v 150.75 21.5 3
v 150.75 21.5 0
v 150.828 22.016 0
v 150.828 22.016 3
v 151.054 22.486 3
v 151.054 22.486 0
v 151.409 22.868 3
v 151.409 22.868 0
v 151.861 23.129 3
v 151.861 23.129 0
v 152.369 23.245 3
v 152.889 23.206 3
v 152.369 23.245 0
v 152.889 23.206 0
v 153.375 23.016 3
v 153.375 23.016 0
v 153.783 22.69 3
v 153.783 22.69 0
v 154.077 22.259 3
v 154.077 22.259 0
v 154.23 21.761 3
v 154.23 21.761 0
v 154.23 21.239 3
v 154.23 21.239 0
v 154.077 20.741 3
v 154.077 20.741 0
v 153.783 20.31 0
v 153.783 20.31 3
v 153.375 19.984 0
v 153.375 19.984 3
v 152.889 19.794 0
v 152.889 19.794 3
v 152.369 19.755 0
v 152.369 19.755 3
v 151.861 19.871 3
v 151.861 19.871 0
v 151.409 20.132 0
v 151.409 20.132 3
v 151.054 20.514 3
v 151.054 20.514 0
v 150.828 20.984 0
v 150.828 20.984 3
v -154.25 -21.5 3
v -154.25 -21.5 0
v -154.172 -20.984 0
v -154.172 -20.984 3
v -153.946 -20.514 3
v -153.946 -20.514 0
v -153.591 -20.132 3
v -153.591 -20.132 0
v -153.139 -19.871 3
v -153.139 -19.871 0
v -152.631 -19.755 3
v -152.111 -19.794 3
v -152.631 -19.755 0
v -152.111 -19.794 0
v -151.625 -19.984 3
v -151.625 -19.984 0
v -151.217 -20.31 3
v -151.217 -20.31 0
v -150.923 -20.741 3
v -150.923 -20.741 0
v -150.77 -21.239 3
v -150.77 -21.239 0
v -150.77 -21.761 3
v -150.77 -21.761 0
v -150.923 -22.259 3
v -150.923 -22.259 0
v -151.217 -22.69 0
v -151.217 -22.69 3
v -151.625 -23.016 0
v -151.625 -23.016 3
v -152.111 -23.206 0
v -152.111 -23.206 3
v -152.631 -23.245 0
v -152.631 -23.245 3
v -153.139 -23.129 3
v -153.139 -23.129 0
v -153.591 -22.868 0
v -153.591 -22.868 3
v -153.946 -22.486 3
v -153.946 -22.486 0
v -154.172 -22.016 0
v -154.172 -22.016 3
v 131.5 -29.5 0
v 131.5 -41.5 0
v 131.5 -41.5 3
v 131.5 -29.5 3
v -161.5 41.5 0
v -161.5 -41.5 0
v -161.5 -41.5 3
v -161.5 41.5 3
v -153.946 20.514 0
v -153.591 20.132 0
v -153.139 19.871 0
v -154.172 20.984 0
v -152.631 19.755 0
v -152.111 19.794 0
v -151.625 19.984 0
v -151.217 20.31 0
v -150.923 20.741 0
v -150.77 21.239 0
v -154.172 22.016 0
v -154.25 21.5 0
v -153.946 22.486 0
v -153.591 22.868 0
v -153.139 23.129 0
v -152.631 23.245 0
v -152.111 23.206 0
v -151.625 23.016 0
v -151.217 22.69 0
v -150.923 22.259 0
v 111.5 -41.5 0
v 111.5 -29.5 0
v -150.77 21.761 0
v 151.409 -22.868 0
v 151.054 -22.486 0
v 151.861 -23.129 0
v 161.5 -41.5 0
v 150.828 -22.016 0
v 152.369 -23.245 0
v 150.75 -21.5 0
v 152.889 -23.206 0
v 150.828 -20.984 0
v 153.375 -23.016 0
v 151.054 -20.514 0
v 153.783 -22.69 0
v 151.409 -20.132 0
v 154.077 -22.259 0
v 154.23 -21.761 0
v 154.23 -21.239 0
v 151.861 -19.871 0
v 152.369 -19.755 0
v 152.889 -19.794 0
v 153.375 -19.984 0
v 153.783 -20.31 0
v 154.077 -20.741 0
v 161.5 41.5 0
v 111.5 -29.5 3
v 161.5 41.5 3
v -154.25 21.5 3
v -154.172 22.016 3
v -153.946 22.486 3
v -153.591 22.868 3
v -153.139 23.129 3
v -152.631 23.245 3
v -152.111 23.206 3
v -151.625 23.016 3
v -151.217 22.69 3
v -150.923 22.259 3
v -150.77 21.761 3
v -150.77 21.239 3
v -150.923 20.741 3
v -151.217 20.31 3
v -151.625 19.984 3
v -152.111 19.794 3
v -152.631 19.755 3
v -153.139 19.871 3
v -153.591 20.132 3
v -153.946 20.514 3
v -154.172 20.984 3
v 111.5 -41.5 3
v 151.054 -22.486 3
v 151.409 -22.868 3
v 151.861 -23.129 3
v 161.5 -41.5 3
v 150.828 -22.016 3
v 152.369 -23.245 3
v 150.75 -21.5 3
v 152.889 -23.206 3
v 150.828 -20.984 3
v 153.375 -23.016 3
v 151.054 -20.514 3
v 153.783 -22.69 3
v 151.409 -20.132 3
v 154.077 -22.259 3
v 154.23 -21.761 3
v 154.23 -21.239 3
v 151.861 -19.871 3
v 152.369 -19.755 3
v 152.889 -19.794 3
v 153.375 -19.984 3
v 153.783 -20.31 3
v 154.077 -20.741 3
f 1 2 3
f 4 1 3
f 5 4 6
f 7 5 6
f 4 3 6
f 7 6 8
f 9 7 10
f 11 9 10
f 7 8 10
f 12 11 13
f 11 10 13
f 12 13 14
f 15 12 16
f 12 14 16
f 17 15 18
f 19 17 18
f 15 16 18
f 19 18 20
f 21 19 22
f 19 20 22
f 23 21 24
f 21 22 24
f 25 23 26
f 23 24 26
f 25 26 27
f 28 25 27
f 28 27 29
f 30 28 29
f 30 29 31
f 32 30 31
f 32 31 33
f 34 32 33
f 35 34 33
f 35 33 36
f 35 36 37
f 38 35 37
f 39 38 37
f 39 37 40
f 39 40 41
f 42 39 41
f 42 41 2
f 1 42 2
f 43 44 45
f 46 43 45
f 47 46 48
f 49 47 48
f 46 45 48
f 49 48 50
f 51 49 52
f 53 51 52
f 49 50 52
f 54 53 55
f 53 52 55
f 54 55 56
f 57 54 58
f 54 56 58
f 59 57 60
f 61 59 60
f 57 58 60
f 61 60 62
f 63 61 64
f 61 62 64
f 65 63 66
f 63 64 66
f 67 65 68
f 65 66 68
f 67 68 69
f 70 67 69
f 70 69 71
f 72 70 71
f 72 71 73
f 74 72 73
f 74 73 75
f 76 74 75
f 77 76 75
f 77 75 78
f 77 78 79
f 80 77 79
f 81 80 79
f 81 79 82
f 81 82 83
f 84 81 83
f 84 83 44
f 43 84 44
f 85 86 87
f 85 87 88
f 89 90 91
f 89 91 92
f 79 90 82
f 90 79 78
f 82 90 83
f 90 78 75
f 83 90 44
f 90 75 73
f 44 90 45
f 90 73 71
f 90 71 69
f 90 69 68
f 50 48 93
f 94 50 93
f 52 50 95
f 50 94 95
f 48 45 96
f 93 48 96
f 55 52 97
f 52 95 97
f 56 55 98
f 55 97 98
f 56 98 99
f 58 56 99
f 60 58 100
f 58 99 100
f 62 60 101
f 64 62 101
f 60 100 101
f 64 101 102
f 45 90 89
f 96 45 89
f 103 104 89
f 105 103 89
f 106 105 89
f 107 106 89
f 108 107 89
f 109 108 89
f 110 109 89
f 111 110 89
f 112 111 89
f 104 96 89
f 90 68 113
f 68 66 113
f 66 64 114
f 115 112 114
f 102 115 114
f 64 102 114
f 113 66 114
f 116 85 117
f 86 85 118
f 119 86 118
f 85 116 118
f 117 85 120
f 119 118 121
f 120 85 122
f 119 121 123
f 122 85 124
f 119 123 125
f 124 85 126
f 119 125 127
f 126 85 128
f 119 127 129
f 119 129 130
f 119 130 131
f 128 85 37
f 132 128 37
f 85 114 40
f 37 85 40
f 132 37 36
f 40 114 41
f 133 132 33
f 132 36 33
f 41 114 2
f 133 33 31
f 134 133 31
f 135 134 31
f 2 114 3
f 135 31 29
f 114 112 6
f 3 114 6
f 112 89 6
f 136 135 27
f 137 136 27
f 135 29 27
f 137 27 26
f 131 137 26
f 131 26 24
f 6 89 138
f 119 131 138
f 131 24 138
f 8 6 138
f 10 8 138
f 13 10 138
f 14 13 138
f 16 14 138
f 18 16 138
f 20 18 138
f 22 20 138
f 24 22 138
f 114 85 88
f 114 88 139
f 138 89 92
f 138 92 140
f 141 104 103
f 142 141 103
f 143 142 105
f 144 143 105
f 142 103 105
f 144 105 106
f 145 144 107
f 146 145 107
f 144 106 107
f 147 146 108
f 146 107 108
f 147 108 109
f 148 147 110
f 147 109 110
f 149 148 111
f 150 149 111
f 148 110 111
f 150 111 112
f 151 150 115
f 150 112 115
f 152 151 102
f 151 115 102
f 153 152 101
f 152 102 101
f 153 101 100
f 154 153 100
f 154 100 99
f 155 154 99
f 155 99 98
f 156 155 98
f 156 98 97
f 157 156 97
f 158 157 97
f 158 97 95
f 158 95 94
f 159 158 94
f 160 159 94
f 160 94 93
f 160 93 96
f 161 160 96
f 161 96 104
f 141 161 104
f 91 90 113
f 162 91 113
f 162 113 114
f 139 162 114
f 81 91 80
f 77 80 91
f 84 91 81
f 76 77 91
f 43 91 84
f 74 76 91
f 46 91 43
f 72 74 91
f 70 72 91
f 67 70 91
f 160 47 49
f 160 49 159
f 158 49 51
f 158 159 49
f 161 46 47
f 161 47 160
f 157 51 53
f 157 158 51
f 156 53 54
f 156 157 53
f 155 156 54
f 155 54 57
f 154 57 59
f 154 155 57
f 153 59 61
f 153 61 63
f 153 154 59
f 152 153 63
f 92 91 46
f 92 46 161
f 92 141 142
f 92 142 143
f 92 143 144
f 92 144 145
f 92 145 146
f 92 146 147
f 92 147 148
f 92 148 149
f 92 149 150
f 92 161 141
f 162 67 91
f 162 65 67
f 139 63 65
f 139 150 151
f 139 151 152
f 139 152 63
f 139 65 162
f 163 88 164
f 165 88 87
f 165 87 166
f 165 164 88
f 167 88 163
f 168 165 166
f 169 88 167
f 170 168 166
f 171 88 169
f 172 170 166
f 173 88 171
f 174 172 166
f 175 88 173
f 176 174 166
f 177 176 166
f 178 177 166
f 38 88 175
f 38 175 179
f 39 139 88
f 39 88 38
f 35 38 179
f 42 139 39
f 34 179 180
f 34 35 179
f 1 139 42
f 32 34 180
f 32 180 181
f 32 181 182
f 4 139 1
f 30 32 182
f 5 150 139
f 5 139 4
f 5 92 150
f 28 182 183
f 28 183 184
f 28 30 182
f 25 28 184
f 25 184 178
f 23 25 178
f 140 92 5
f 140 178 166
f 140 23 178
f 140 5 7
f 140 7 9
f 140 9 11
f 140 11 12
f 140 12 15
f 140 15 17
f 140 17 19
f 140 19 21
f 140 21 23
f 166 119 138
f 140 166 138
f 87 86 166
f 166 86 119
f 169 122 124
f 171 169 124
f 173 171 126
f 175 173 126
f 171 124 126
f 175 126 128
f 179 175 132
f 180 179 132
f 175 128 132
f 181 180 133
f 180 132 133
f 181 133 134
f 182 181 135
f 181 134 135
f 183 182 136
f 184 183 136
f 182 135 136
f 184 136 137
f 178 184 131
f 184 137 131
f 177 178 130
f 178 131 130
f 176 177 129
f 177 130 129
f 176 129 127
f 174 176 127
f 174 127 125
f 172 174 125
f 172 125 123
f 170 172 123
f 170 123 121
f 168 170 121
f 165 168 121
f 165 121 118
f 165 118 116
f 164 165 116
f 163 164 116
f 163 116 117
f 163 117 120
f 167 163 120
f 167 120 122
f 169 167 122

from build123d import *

# Parameters (mm, degrees)
SKETCH1_W           = 323
SKETCH1_H           = 83
BOSS_EXTRUDE1_DEPTH = 3
SKETCH2_W           = 20
SKETCH2_H           = 12
CUT_EXTRUDE1_DEPTH  = 10
SKETCH4_R           = 1.75
CUT_EXTRUDE2_DEPTH  = 4


with BuildPart() as part:
    # Sketch1 → Boss-Extrude1 (new body)
    with BuildSketch(Plane.XY):
        Rectangle(SKETCH1_W, SKETCH1_H)
    extrude(amount=BOSS_EXTRUDE1_DEPTH)

    # Sketch2 → Cut-Extrude1 (cut)
    with BuildSketch(Plane(origin=(0, 0, 0), x_dir=(-1, 0, 0), z_dir=(0, 0, -1))):
        with Locations((-121.5, -35.5)):
            Rectangle(SKETCH2_W, SKETCH2_H)
    extrude(amount=-CUT_EXTRUDE1_DEPTH, mode=Mode.SUBTRACT)

    # Sketch4 → Cut-Extrude2 (cut, through all)
    with BuildSketch(Plane(origin=(0, 0, 0), x_dir=(-1, 0, 0), z_dir=(0, 0, -1))):
        with Locations((152.5, -21.5)):
            Circle(SKETCH4_R)
        with Locations((-152.5, -21.5)):
            Circle(SKETCH4_R)
        with Locations((152.5, 21.5)):
            Circle(SKETCH4_R)
        with Locations((-152.5, 21.5)):
            Circle(SKETCH4_R)
    extrude(amount=-CUT_EXTRUDE2_DEPTH, mode=Mode.SUBTRACT)


solid = part.part
